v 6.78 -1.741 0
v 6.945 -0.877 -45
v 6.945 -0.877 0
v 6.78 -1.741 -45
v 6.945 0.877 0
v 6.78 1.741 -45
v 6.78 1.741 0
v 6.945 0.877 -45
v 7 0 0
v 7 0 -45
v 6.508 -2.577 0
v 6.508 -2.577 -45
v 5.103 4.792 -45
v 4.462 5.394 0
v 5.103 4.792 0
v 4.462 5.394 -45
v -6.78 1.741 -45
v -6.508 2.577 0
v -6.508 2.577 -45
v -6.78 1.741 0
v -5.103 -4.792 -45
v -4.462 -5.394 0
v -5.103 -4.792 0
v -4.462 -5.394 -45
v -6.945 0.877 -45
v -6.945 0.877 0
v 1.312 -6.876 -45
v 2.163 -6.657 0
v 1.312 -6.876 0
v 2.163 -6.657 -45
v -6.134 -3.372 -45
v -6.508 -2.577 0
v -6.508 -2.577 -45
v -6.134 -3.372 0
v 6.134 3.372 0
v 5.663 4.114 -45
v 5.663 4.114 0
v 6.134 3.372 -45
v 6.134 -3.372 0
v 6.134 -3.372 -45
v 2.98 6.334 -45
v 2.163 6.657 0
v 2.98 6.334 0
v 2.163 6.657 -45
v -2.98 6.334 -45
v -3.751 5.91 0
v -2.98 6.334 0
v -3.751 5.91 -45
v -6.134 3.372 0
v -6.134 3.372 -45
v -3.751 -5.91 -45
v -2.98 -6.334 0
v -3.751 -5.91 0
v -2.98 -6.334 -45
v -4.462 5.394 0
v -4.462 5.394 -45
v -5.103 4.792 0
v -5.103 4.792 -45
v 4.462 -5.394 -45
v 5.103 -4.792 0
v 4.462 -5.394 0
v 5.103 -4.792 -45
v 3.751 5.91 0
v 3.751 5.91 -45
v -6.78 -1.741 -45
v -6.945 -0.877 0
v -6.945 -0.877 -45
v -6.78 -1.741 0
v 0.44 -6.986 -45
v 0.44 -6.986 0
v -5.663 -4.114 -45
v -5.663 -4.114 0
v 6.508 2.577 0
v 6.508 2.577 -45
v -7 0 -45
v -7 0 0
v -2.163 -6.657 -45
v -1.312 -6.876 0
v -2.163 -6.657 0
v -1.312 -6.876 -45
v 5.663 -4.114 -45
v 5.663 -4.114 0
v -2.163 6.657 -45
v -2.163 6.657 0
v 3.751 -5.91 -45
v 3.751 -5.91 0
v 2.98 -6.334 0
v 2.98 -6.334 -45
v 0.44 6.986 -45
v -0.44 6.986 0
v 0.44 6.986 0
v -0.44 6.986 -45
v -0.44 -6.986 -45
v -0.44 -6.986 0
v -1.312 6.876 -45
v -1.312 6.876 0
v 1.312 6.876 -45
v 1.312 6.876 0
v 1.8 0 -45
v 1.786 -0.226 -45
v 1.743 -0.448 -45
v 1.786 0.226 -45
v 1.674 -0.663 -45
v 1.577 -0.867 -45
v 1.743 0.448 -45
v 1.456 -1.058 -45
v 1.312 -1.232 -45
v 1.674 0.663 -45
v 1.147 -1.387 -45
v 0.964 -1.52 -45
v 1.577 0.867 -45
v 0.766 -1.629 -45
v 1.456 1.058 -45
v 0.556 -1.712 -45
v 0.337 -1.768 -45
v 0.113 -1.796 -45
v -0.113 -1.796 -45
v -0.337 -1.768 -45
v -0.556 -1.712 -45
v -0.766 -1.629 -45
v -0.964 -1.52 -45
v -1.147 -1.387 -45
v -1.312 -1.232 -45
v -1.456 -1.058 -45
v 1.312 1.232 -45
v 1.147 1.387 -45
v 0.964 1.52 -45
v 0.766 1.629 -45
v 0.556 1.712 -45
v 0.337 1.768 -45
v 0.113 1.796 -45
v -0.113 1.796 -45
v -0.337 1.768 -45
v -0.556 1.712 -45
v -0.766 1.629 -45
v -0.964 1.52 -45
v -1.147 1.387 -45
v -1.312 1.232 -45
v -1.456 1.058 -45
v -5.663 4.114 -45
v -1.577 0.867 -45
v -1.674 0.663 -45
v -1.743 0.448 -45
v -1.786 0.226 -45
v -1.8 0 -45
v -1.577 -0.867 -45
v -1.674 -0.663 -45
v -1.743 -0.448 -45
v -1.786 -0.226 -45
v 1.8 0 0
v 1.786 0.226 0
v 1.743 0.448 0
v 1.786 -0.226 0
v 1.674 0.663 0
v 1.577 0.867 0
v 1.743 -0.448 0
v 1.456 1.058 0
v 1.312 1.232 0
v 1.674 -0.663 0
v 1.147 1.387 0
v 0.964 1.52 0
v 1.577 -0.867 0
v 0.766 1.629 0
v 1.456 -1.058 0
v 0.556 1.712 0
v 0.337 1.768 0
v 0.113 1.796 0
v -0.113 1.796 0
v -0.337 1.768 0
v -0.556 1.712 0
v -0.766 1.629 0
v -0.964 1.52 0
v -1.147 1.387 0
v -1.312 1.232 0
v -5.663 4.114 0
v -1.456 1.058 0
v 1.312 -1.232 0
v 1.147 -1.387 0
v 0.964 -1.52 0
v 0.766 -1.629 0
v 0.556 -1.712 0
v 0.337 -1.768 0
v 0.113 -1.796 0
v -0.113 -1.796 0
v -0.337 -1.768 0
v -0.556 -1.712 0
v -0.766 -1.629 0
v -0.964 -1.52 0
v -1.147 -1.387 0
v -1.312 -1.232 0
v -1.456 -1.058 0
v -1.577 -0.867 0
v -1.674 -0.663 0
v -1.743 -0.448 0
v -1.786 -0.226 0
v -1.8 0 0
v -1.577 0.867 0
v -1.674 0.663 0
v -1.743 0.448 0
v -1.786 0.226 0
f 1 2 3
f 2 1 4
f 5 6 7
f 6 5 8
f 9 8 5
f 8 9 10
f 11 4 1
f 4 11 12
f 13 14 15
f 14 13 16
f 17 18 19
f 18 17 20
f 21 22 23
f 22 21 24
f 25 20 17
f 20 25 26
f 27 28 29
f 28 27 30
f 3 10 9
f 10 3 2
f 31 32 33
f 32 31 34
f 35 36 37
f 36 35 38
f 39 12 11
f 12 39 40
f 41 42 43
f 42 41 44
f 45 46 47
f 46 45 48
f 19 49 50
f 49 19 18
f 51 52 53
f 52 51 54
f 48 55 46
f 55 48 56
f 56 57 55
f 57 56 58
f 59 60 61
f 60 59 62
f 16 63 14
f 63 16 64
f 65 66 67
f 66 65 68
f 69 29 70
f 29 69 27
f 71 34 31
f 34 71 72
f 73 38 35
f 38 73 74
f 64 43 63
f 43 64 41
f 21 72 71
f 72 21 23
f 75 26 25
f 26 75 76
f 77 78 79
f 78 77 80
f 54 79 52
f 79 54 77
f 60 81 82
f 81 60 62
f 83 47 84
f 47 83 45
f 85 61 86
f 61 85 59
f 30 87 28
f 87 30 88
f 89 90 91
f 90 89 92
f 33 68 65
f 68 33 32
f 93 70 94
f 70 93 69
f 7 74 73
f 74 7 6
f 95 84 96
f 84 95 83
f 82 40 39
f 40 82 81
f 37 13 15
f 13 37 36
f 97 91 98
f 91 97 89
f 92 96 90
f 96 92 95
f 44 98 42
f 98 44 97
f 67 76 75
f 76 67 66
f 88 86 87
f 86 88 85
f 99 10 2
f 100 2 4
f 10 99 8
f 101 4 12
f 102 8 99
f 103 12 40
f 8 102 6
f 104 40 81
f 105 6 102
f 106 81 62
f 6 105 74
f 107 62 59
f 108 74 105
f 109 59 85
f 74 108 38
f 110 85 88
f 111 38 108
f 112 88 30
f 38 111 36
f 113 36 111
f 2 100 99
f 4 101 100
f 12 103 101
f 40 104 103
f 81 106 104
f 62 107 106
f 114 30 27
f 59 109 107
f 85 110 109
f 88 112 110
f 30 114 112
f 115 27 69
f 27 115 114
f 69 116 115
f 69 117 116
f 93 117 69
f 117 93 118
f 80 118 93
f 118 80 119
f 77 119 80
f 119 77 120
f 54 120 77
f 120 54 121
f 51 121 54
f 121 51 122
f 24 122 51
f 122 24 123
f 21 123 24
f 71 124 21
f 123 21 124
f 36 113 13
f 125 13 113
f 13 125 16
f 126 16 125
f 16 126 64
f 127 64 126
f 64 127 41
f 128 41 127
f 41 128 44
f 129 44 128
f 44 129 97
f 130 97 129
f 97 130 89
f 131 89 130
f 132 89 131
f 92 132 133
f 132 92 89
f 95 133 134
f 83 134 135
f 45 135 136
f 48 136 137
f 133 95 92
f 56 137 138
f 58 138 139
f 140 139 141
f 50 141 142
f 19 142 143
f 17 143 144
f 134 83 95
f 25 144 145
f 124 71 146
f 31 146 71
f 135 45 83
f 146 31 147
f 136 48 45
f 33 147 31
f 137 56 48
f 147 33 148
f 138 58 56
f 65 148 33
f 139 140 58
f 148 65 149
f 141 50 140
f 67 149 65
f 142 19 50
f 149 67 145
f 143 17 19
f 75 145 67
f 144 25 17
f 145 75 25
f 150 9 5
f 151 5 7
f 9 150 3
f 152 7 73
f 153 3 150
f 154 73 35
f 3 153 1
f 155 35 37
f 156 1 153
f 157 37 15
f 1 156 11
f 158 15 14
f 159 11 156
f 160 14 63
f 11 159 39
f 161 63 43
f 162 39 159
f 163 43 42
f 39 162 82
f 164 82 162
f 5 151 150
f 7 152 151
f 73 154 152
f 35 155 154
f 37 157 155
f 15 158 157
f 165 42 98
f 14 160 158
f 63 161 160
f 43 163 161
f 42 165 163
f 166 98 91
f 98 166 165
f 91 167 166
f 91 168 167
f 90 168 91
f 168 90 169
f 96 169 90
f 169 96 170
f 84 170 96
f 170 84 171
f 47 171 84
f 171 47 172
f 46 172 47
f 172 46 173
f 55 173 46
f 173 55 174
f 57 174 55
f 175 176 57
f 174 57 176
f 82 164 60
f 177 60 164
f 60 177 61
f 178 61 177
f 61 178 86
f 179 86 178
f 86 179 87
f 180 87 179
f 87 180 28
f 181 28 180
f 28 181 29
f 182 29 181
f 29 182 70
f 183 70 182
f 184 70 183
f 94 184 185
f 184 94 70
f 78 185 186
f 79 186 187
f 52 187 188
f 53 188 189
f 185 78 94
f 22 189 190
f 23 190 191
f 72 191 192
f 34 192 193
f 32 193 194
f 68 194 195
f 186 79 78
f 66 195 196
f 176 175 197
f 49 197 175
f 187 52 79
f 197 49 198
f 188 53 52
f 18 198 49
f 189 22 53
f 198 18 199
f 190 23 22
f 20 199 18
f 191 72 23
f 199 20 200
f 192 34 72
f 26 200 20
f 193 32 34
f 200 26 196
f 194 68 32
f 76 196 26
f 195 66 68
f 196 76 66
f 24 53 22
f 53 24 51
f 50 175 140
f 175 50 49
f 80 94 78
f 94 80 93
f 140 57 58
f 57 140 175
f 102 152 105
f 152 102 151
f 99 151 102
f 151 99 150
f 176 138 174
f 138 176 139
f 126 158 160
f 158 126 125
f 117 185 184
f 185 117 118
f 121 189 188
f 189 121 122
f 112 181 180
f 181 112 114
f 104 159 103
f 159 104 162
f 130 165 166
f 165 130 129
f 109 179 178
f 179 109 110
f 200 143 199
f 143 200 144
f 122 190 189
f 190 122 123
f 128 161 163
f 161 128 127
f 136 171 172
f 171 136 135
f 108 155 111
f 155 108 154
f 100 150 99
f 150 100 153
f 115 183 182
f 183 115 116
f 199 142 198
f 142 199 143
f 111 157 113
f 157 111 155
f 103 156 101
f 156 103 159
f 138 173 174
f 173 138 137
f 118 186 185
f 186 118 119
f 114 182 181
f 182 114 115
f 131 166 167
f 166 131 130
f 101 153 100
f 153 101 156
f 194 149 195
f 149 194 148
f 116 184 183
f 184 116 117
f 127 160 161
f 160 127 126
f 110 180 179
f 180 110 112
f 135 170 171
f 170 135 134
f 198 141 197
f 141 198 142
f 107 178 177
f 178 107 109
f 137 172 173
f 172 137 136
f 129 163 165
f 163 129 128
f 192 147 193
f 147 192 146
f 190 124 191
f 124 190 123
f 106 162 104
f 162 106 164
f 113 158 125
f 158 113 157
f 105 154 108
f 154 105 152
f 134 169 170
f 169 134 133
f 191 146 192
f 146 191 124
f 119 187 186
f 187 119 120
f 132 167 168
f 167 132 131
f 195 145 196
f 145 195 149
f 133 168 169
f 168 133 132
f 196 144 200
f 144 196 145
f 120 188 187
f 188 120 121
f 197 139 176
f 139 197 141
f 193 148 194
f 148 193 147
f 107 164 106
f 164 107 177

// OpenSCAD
$fn = 50;


difference() {
	union() {
		translate(v = [0, 0, -45.0000000000]) {
			cylinder(h = 45, r = 7.0000000000);
		}
		cylinder(h = 0, r = 13.0000000000);
	}
	union() {
		#translate(v = [0, 0, -45]) {
			cylinder(h = 45, r = 1.8000000000);
		}
	}
}
